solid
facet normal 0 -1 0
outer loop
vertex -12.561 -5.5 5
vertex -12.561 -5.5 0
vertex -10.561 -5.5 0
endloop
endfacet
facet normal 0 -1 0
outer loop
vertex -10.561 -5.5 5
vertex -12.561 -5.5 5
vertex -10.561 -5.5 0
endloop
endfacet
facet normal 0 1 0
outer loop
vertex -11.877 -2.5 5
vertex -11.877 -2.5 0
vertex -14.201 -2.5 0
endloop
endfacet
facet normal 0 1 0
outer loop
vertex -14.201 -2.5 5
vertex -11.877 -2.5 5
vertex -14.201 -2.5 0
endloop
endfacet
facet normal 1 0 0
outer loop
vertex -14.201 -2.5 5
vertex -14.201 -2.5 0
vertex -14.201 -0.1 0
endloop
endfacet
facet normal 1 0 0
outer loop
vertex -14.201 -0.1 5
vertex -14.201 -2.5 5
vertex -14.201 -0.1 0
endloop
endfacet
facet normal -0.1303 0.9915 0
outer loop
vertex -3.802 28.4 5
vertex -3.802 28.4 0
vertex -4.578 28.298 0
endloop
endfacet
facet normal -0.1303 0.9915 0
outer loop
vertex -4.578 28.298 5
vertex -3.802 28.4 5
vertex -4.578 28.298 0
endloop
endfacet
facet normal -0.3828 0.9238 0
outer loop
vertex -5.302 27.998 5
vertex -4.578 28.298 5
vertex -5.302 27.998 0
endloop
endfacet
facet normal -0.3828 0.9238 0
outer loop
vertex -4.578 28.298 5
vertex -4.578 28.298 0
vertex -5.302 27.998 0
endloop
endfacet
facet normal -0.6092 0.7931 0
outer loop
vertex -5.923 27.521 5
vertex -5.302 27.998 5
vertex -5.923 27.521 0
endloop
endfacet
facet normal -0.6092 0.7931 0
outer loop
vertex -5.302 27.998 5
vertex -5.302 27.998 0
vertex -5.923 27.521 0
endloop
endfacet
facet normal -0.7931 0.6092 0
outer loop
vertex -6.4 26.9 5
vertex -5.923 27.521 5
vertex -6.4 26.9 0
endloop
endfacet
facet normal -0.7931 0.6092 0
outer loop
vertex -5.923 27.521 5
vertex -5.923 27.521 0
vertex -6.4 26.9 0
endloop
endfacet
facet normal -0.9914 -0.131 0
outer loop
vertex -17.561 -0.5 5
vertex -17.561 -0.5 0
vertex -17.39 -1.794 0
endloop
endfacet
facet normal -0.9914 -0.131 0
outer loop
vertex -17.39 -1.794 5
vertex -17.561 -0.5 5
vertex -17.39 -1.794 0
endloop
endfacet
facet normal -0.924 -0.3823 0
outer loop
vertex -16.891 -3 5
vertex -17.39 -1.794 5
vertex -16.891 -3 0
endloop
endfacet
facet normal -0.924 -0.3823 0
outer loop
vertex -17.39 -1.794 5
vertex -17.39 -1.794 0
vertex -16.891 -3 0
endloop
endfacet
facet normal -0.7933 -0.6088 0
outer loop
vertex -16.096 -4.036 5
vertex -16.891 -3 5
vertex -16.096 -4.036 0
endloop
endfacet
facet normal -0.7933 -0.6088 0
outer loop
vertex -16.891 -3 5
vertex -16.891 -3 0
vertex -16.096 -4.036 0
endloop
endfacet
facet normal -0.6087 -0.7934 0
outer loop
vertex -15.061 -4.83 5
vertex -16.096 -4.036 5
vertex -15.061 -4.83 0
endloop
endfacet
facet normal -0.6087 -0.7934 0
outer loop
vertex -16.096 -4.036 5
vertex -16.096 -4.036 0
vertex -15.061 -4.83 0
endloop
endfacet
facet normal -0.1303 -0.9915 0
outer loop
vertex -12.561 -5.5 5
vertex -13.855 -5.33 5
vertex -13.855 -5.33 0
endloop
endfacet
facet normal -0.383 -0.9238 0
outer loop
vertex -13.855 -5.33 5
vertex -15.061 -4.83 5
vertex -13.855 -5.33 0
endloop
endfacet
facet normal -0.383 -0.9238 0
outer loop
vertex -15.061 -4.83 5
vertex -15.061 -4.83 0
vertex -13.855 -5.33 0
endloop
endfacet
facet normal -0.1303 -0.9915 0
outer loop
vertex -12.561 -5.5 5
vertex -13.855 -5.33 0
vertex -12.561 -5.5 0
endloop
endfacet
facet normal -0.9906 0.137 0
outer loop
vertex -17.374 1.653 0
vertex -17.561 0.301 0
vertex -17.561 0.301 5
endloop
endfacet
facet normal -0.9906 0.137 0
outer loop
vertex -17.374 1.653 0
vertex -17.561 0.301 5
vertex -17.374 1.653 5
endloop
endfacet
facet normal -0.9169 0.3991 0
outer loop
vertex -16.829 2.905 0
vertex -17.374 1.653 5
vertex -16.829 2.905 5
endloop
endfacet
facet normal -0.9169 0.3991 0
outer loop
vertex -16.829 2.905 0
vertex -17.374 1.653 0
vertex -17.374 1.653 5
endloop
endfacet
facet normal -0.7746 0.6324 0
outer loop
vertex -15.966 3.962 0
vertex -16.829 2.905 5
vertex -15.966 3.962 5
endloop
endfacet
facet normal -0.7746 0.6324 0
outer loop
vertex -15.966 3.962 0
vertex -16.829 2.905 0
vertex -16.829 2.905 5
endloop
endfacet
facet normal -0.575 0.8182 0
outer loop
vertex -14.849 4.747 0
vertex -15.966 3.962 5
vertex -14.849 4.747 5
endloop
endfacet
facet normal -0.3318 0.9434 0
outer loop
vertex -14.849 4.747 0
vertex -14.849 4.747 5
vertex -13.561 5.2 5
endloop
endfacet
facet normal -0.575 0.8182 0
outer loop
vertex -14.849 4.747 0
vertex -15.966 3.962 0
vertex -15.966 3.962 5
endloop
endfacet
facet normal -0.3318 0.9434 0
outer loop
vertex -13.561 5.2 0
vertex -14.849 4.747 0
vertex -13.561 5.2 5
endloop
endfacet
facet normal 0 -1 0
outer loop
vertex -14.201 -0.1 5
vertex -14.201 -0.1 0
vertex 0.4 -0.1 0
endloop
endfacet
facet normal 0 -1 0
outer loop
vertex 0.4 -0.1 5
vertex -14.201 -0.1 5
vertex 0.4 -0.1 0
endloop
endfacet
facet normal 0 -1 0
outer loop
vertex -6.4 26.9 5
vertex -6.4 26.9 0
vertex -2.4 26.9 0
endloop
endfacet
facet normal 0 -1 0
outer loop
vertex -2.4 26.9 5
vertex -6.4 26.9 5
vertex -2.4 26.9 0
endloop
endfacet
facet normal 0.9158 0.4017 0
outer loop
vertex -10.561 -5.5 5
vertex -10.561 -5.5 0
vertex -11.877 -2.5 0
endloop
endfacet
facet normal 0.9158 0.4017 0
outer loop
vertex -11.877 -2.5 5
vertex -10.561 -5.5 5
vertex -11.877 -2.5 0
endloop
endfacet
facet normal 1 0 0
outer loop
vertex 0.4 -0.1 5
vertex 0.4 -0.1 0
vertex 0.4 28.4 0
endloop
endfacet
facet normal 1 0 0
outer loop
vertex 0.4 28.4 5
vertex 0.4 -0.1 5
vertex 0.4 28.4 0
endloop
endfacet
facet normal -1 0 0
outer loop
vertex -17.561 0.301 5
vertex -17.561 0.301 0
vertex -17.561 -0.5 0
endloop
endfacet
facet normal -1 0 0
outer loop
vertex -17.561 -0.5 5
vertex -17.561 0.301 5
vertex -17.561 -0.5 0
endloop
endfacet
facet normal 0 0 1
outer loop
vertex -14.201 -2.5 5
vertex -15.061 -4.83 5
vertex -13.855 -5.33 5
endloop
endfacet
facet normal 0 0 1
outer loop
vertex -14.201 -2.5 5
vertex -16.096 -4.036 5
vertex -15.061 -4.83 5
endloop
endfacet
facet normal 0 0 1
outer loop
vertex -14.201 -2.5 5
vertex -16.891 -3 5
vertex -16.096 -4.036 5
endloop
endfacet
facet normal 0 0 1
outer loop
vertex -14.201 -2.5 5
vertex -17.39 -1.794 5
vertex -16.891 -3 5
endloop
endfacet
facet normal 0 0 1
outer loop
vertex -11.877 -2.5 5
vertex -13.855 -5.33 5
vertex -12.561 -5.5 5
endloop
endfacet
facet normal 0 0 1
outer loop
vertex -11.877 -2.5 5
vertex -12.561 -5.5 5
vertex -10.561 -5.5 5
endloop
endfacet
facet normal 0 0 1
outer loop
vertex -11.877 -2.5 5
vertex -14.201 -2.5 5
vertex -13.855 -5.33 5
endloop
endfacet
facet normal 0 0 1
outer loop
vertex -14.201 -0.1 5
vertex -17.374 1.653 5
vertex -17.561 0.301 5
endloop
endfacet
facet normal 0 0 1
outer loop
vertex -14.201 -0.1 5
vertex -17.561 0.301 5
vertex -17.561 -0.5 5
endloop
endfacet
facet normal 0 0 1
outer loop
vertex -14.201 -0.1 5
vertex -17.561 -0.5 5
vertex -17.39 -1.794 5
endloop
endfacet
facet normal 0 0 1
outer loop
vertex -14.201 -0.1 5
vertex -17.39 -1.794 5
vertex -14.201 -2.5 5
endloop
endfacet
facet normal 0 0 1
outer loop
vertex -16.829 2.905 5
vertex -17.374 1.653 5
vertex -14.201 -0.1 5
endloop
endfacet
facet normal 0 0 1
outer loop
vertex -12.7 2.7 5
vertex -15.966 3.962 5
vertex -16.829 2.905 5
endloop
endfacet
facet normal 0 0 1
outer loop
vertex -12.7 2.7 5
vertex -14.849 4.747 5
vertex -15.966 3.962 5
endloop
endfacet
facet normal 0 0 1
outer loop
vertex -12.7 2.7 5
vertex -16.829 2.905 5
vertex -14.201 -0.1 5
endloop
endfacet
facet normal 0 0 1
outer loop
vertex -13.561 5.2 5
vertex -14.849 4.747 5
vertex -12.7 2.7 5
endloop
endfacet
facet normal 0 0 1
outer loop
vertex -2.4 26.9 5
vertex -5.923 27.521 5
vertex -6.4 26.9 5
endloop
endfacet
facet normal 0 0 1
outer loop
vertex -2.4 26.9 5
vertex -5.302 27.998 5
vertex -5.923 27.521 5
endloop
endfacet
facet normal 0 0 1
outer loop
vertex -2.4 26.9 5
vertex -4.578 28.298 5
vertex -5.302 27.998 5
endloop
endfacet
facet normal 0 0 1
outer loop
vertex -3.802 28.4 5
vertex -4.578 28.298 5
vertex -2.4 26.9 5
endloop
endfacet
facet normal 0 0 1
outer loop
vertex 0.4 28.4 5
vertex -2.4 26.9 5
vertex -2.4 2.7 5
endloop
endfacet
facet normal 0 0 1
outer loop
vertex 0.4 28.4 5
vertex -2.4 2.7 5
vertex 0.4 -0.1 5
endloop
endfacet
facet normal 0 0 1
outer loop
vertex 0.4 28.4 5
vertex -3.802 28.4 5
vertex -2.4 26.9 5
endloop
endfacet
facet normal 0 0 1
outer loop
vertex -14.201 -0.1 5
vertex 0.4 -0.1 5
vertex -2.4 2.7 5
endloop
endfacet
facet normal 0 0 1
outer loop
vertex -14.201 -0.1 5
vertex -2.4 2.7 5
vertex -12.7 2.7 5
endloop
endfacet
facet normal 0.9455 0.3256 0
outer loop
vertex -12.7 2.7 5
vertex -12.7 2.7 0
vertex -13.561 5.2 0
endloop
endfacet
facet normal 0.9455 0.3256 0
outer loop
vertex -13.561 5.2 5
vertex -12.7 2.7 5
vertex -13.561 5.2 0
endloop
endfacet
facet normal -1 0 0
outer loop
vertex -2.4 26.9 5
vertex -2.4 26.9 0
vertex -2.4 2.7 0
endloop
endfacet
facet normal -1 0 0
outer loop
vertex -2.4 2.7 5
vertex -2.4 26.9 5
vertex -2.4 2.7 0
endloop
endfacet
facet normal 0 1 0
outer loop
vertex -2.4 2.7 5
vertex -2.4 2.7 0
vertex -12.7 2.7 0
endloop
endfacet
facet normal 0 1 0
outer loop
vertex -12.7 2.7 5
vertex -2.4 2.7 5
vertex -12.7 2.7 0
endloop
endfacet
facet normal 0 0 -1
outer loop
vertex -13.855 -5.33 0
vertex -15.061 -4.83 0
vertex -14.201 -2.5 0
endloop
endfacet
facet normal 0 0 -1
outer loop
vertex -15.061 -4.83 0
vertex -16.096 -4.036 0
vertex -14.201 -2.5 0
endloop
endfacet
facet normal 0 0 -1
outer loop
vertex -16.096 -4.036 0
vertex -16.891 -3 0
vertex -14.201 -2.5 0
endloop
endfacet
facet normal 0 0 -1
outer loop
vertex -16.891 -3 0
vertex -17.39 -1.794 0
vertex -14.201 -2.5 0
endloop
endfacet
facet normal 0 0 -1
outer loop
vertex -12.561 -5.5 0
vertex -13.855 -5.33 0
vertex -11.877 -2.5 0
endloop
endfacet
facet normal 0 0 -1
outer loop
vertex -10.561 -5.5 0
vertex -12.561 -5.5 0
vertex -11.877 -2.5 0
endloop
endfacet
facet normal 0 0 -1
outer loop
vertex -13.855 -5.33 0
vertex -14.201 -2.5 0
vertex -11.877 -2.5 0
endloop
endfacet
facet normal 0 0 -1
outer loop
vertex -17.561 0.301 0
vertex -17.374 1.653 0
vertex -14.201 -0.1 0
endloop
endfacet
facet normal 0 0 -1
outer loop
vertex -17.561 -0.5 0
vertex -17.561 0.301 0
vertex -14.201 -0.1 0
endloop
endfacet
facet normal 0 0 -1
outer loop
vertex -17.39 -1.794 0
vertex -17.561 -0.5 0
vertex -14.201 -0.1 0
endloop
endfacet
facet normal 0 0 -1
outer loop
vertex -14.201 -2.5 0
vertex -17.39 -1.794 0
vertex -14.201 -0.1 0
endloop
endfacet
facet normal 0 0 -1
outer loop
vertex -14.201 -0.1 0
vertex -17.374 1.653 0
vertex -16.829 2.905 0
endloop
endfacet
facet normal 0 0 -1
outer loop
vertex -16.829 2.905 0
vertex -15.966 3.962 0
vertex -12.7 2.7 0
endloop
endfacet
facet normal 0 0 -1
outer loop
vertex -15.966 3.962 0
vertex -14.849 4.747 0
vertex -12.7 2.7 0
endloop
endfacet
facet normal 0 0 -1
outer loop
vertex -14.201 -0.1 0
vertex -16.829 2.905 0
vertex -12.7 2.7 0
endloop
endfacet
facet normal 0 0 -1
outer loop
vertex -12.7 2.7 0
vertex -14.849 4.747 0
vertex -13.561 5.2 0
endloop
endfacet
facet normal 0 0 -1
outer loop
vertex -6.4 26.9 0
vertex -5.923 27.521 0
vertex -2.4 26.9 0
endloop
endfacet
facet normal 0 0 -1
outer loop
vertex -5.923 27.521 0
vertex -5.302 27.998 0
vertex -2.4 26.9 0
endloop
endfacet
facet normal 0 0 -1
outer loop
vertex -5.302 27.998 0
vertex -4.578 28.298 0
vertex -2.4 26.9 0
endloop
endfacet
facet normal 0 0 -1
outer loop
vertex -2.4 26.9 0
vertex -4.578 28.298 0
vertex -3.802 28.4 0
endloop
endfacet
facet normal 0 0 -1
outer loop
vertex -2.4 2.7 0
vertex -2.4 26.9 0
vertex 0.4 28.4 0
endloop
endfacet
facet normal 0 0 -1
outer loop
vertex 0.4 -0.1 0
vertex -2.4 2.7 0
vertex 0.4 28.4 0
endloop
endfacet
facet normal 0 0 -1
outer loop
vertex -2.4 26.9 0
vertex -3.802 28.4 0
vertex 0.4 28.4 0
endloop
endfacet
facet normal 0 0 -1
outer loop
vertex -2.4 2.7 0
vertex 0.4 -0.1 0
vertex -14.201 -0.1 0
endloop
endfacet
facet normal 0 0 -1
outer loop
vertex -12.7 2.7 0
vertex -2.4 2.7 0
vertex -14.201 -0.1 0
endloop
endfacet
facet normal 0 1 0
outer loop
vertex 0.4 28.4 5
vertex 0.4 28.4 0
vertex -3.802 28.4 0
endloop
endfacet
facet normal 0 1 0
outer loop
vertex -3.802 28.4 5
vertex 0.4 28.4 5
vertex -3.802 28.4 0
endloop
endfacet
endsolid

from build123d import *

# Parameters (mm, degrees)
F0_W        = 0.4
F0_H        = 28.4
F1_DEPTH    = 5
F2_T1_DEPTH = 17.9903810568
F3_T1_DEPTH = 29.4948974279
F3_T3_DEPTH = 30


# Not quite as in the source:
# - a fillet or chamfer that OpenCascade refuses, or shapes differently, is made with other operations: its cross-section is extruded or revolved along the edge and cut away or added


with BuildPart() as f1:
    # F0 (on Top) → F1 (new body)
    with BuildSketch(Plane.XY):
        Polygon((-17.5608190332, -5.5), (-10.5608190332, -5.5), (-11.8766345504, -2.5), (-14.2008190332, -2.5), (-14.2008190332, -0.1), (-14.2008190332, 0), (0, 0), (0, 28.4), (-6.4, 28.4), (-6.4, 26.9), (-2.4, 26.9), (-2.4, 2.7), (-12.7, 2.7), (-13.5608190332, 5.2), (-17.5608190332, 5.2), align=None)
        Polygon((-14.2008190332, 0), (-14.2008190332, -0.1), (0.4, -0.1), (0.4, 0), (0, 0), align=None)
        with Locations((0.2, 14.2)):
            Rectangle(F0_W, F0_H)
    extrude(amount=F1_DEPTH)

    # F2: fillet of radius 3 on 1 edges, made by hand

    # F2_s2 → F2_t1 (cut)
    with BuildSketch(Plane.XY.offset(-6.4951905284)):
        with BuildLine():
            ThreePointArc((-3.8019237886, 28.4), (-5.3019237886, 27.9980762114), (-6.4, 26.9))
            Line((-6.4, 26.9), (-6.4, 28.4))
            Line((-6.4, 28.4), (-3.8019237886, 28.4))
        make_face()
    extrude(amount=F2_T1_DEPTH, mode=Mode.SUBTRACT)

    # F3: fillet of radius 5 on 2 edges, made by hand

    # F3_s2 → F3_t1 (cut)
    with BuildSketch(Plane.XY.offset(-12.2474487139)):
        with BuildLine():
            ThreePointArc((-17.5608190332, 0.3010205144), (-16.4338023794, 3.4632981746), (-13.5608190332, 5.2))
            Line((-13.5608190332, 5.2), (-17.5608190332, 5.2))
            Line((-17.5608190332, 5.2), (-17.5608190332, 0.3010205144))
        make_face()
    extrude(amount=F3_T1_DEPTH, mode=Mode.SUBTRACT)

    # F3_s4 → F3_t3 (cut)
    with BuildSketch(Plane.XY.offset(-12.5)):
        with BuildLine():
            ThreePointArc((-17.5608190332, -0.5), (-16.0963529392, -4.0355339059), (-12.5608190332, -5.5))
            Line((-12.5608190332, -5.5), (-17.5608190332, -5.5))
            Line((-17.5608190332, -5.5), (-17.5608190332, -0.5))
        make_face()
    extrude(amount=F3_T3_DEPTH, mode=Mode.SUBTRACT)


solid = f1.part
